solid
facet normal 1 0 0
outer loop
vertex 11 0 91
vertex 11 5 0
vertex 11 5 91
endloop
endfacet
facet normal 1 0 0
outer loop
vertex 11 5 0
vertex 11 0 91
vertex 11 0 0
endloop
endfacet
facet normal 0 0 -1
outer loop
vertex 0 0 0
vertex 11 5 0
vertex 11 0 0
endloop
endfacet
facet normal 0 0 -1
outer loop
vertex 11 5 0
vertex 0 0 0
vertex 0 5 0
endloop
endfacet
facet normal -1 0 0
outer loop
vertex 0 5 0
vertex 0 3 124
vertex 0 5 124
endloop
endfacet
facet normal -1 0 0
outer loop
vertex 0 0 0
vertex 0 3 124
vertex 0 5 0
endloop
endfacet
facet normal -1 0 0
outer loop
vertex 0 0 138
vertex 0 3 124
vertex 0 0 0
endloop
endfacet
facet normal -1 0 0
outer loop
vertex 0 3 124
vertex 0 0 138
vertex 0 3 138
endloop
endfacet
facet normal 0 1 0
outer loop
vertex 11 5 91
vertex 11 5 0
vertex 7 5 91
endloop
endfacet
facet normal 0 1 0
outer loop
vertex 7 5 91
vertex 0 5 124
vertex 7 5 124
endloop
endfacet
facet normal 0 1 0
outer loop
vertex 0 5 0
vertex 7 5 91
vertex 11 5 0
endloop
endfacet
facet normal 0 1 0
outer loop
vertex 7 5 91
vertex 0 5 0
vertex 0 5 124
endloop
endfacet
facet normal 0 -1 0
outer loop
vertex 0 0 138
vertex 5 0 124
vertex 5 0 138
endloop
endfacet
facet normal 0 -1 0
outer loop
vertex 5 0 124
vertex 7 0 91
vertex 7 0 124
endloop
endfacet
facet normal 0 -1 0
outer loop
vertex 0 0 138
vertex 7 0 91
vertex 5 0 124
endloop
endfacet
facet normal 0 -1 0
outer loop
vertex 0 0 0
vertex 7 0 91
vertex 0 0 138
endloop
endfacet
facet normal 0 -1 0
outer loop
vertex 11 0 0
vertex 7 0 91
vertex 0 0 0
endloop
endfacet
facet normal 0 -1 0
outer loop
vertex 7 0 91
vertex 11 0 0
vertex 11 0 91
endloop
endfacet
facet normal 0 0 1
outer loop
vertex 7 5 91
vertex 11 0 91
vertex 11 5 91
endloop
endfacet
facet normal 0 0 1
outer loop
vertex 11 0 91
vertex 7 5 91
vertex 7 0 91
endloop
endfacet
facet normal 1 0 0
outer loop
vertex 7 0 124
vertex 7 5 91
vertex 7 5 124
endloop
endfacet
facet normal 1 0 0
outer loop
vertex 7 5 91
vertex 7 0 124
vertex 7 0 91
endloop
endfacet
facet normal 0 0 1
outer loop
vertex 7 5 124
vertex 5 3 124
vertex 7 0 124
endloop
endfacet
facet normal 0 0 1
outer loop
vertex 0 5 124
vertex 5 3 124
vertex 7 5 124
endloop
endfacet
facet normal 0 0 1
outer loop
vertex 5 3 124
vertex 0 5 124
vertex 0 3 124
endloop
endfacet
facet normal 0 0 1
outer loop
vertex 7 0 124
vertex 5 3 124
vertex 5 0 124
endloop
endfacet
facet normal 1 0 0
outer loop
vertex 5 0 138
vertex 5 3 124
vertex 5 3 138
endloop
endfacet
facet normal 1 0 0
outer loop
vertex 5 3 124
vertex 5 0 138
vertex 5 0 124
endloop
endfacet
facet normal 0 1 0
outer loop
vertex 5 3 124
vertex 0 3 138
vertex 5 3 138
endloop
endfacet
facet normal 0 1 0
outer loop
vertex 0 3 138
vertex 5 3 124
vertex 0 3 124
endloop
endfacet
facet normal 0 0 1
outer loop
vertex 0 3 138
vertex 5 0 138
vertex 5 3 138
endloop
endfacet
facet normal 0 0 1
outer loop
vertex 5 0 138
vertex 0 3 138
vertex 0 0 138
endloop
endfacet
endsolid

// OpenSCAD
translate([5.5, 2.5, 3.5]) color([0.23357109614697547, 0.8647767439340015, 0.020481785066310598]) cube([11, 5, 7], center=true);
translate([5.5, 2.5, 10.5]) color([0.8852550461906246, 0.7407454042283365, 0.30244204779608386]) cube([11, 5, 7], center=true);
translate([5.5, 2.5, 17.5]) color([0.5702666361217156, 0.3326858137966755, 0.49351002171548763]) cube([11, 5, 7], center=true);
translate([5.5, 2.5, 24.5]) color([0.2620075340788589, 0.8250203378707534, 0.7724801555877414]) cube([11, 5, 7], center=true);
translate([5.5, 2.5, 31.5]) color([0.3841597274693662, 0.3836794276703801, 0.16379542381305134]) cube([11, 5, 7], center=true);
translate([5.5, 2.5, 38.5]) color([0.9355243379423083, 0.23895170008456956, 0.7294506641472926]) cube([11, 5, 7], center=true);
translate([5.5, 2.5, 45.5]) color([0.334024645801835, 0.9418620991403894, 0.4813304127593788]) cube([11, 5, 7], center=true);
translate([5.5, 2.5, 52.5]) color([0.14090487727396894, 0.8899614875266342, 0.6019667067914363]) cube([11, 5, 7], center=true);
translate([5.5, 2.5, 59.5]) color([0.08161964024263468, 0.6986964058233333, 0.8102884962164306]) cube([11, 5, 7], center=true);
translate([5.5, 2.5, 66.5]) color([0.3527718366022422, 0.03517979094215373, 0.4662789582213983]) cube([11, 5, 7], center=true);
translate([5.5, 2.5, 73.5]) color([0.458882332198567, 0.10148050986892876, 0.7781483542276006]) cube([11, 5, 7], center=true);
translate([5.5, 2.5, 80.5]) color([0.02022807324279441, 0.5983002604350479, 0.13270195297871745]) cube([11, 5, 7], center=true);
translate([5.5, 2.5, 87.5]) color([0.3239113547302247, 0.7000796910311562, 0.6489922579129634]) cube([11, 5, 7], center=true);
translate([3.5, 2.5, 92.5]) color([0.19497362064878687, 0.7834169698984913, 0.7774609885388588]) cube([7, 5, 3], center=true);
translate([3.5, 2.5, 95.5]) color([0.11099692345616674, 0.060160827712116616, 0.7008174245595068]) cube([7, 5, 3], center=true);
translate([3.5, 2.5, 98.5]) color([0.6143308403515266, 0.9339155207415325, 0.6504721799814983]) cube([7, 5, 3], center=true);
translate([3.5, 2.5, 101.5]) color([0.9694854220936419, 0.7136168898793864, 0.2963863893491513]) cube([7, 5, 3], center=true);
translate([3.5, 2.5, 104.5]) color([0.8491315553121948, 0.95846907728749, 0.38764569013819994]) cube([7, 5, 3], center=true);
translate([3.5, 2.5, 107.5]) color([0.29380353478258403, 0.7457841029207014, 0.9575468650535228]) cube([7, 5, 3], center=true);
translate([3.5, 2.5, 110.5]) color([0.98339807845839, 0.12155240415787172, 0.8604321836344089]) cube([7, 5, 3], center=true);
translate([3.5, 2.5, 113.5]) color([0.9958411320233901, 0.03818441020037311, 0.39202639046743215]) cube([7, 5, 3], center=true);
translate([3.5, 2.5, 116.5]) color([0.3715816420064585, 0.19047756087385292, 0.3565538137373233]) cube([7, 5, 3], center=true);
translate([3.5, 2.5, 119.5]) color([0.6320134108911423, 0.9564975354421206, 0.901927522825372]) cube([7, 5, 3], center=true);
translate([3.5, 2.5, 122.5]) color([0.039980675922074105, 0.2553863294502452, 0.02665600139486224]) cube([7, 5, 3], center=true);
translate([2.5, 1.5, 125.0]) color([0.5200631817170318, 0.5692567569896342, 0.8758772851227178]) cube([5, 3, 2], center=true);
translate([2.5, 1.5, 127.0]) color([0.2296552367022351, 0.7763426439418957, 0.8846860519705121]) cube([5, 3, 2], center=true);
translate([2.5, 1.5, 129.0]) color([0.6274277551427163, 0.5024128608294012, 0.5237115354844265]) cube([5, 3, 2], center=true);
translate([2.5, 1.5, 131.0]) color([0.5071067236759631, 0.9454855480301745, 0.14569042195357562]) cube([5, 3, 2], center=true);
translate([2.5, 1.5, 133.0]) color([0.8918421087116969, 0.42205651792049836, 0.08403205823715598]) cube([5, 3, 2], center=true);
translate([2.5, 1.5, 135.0]) color([0.1047646210762947, 0.06292282863863541, 0.4151614515022839]) cube([5, 3, 2], center=true);
translate([2.5, 1.5, 137.0]) color([0.15615697007089357, 0.9545538427732947, 0.7913428503775491]) cube([5, 3, 2], center=true);
